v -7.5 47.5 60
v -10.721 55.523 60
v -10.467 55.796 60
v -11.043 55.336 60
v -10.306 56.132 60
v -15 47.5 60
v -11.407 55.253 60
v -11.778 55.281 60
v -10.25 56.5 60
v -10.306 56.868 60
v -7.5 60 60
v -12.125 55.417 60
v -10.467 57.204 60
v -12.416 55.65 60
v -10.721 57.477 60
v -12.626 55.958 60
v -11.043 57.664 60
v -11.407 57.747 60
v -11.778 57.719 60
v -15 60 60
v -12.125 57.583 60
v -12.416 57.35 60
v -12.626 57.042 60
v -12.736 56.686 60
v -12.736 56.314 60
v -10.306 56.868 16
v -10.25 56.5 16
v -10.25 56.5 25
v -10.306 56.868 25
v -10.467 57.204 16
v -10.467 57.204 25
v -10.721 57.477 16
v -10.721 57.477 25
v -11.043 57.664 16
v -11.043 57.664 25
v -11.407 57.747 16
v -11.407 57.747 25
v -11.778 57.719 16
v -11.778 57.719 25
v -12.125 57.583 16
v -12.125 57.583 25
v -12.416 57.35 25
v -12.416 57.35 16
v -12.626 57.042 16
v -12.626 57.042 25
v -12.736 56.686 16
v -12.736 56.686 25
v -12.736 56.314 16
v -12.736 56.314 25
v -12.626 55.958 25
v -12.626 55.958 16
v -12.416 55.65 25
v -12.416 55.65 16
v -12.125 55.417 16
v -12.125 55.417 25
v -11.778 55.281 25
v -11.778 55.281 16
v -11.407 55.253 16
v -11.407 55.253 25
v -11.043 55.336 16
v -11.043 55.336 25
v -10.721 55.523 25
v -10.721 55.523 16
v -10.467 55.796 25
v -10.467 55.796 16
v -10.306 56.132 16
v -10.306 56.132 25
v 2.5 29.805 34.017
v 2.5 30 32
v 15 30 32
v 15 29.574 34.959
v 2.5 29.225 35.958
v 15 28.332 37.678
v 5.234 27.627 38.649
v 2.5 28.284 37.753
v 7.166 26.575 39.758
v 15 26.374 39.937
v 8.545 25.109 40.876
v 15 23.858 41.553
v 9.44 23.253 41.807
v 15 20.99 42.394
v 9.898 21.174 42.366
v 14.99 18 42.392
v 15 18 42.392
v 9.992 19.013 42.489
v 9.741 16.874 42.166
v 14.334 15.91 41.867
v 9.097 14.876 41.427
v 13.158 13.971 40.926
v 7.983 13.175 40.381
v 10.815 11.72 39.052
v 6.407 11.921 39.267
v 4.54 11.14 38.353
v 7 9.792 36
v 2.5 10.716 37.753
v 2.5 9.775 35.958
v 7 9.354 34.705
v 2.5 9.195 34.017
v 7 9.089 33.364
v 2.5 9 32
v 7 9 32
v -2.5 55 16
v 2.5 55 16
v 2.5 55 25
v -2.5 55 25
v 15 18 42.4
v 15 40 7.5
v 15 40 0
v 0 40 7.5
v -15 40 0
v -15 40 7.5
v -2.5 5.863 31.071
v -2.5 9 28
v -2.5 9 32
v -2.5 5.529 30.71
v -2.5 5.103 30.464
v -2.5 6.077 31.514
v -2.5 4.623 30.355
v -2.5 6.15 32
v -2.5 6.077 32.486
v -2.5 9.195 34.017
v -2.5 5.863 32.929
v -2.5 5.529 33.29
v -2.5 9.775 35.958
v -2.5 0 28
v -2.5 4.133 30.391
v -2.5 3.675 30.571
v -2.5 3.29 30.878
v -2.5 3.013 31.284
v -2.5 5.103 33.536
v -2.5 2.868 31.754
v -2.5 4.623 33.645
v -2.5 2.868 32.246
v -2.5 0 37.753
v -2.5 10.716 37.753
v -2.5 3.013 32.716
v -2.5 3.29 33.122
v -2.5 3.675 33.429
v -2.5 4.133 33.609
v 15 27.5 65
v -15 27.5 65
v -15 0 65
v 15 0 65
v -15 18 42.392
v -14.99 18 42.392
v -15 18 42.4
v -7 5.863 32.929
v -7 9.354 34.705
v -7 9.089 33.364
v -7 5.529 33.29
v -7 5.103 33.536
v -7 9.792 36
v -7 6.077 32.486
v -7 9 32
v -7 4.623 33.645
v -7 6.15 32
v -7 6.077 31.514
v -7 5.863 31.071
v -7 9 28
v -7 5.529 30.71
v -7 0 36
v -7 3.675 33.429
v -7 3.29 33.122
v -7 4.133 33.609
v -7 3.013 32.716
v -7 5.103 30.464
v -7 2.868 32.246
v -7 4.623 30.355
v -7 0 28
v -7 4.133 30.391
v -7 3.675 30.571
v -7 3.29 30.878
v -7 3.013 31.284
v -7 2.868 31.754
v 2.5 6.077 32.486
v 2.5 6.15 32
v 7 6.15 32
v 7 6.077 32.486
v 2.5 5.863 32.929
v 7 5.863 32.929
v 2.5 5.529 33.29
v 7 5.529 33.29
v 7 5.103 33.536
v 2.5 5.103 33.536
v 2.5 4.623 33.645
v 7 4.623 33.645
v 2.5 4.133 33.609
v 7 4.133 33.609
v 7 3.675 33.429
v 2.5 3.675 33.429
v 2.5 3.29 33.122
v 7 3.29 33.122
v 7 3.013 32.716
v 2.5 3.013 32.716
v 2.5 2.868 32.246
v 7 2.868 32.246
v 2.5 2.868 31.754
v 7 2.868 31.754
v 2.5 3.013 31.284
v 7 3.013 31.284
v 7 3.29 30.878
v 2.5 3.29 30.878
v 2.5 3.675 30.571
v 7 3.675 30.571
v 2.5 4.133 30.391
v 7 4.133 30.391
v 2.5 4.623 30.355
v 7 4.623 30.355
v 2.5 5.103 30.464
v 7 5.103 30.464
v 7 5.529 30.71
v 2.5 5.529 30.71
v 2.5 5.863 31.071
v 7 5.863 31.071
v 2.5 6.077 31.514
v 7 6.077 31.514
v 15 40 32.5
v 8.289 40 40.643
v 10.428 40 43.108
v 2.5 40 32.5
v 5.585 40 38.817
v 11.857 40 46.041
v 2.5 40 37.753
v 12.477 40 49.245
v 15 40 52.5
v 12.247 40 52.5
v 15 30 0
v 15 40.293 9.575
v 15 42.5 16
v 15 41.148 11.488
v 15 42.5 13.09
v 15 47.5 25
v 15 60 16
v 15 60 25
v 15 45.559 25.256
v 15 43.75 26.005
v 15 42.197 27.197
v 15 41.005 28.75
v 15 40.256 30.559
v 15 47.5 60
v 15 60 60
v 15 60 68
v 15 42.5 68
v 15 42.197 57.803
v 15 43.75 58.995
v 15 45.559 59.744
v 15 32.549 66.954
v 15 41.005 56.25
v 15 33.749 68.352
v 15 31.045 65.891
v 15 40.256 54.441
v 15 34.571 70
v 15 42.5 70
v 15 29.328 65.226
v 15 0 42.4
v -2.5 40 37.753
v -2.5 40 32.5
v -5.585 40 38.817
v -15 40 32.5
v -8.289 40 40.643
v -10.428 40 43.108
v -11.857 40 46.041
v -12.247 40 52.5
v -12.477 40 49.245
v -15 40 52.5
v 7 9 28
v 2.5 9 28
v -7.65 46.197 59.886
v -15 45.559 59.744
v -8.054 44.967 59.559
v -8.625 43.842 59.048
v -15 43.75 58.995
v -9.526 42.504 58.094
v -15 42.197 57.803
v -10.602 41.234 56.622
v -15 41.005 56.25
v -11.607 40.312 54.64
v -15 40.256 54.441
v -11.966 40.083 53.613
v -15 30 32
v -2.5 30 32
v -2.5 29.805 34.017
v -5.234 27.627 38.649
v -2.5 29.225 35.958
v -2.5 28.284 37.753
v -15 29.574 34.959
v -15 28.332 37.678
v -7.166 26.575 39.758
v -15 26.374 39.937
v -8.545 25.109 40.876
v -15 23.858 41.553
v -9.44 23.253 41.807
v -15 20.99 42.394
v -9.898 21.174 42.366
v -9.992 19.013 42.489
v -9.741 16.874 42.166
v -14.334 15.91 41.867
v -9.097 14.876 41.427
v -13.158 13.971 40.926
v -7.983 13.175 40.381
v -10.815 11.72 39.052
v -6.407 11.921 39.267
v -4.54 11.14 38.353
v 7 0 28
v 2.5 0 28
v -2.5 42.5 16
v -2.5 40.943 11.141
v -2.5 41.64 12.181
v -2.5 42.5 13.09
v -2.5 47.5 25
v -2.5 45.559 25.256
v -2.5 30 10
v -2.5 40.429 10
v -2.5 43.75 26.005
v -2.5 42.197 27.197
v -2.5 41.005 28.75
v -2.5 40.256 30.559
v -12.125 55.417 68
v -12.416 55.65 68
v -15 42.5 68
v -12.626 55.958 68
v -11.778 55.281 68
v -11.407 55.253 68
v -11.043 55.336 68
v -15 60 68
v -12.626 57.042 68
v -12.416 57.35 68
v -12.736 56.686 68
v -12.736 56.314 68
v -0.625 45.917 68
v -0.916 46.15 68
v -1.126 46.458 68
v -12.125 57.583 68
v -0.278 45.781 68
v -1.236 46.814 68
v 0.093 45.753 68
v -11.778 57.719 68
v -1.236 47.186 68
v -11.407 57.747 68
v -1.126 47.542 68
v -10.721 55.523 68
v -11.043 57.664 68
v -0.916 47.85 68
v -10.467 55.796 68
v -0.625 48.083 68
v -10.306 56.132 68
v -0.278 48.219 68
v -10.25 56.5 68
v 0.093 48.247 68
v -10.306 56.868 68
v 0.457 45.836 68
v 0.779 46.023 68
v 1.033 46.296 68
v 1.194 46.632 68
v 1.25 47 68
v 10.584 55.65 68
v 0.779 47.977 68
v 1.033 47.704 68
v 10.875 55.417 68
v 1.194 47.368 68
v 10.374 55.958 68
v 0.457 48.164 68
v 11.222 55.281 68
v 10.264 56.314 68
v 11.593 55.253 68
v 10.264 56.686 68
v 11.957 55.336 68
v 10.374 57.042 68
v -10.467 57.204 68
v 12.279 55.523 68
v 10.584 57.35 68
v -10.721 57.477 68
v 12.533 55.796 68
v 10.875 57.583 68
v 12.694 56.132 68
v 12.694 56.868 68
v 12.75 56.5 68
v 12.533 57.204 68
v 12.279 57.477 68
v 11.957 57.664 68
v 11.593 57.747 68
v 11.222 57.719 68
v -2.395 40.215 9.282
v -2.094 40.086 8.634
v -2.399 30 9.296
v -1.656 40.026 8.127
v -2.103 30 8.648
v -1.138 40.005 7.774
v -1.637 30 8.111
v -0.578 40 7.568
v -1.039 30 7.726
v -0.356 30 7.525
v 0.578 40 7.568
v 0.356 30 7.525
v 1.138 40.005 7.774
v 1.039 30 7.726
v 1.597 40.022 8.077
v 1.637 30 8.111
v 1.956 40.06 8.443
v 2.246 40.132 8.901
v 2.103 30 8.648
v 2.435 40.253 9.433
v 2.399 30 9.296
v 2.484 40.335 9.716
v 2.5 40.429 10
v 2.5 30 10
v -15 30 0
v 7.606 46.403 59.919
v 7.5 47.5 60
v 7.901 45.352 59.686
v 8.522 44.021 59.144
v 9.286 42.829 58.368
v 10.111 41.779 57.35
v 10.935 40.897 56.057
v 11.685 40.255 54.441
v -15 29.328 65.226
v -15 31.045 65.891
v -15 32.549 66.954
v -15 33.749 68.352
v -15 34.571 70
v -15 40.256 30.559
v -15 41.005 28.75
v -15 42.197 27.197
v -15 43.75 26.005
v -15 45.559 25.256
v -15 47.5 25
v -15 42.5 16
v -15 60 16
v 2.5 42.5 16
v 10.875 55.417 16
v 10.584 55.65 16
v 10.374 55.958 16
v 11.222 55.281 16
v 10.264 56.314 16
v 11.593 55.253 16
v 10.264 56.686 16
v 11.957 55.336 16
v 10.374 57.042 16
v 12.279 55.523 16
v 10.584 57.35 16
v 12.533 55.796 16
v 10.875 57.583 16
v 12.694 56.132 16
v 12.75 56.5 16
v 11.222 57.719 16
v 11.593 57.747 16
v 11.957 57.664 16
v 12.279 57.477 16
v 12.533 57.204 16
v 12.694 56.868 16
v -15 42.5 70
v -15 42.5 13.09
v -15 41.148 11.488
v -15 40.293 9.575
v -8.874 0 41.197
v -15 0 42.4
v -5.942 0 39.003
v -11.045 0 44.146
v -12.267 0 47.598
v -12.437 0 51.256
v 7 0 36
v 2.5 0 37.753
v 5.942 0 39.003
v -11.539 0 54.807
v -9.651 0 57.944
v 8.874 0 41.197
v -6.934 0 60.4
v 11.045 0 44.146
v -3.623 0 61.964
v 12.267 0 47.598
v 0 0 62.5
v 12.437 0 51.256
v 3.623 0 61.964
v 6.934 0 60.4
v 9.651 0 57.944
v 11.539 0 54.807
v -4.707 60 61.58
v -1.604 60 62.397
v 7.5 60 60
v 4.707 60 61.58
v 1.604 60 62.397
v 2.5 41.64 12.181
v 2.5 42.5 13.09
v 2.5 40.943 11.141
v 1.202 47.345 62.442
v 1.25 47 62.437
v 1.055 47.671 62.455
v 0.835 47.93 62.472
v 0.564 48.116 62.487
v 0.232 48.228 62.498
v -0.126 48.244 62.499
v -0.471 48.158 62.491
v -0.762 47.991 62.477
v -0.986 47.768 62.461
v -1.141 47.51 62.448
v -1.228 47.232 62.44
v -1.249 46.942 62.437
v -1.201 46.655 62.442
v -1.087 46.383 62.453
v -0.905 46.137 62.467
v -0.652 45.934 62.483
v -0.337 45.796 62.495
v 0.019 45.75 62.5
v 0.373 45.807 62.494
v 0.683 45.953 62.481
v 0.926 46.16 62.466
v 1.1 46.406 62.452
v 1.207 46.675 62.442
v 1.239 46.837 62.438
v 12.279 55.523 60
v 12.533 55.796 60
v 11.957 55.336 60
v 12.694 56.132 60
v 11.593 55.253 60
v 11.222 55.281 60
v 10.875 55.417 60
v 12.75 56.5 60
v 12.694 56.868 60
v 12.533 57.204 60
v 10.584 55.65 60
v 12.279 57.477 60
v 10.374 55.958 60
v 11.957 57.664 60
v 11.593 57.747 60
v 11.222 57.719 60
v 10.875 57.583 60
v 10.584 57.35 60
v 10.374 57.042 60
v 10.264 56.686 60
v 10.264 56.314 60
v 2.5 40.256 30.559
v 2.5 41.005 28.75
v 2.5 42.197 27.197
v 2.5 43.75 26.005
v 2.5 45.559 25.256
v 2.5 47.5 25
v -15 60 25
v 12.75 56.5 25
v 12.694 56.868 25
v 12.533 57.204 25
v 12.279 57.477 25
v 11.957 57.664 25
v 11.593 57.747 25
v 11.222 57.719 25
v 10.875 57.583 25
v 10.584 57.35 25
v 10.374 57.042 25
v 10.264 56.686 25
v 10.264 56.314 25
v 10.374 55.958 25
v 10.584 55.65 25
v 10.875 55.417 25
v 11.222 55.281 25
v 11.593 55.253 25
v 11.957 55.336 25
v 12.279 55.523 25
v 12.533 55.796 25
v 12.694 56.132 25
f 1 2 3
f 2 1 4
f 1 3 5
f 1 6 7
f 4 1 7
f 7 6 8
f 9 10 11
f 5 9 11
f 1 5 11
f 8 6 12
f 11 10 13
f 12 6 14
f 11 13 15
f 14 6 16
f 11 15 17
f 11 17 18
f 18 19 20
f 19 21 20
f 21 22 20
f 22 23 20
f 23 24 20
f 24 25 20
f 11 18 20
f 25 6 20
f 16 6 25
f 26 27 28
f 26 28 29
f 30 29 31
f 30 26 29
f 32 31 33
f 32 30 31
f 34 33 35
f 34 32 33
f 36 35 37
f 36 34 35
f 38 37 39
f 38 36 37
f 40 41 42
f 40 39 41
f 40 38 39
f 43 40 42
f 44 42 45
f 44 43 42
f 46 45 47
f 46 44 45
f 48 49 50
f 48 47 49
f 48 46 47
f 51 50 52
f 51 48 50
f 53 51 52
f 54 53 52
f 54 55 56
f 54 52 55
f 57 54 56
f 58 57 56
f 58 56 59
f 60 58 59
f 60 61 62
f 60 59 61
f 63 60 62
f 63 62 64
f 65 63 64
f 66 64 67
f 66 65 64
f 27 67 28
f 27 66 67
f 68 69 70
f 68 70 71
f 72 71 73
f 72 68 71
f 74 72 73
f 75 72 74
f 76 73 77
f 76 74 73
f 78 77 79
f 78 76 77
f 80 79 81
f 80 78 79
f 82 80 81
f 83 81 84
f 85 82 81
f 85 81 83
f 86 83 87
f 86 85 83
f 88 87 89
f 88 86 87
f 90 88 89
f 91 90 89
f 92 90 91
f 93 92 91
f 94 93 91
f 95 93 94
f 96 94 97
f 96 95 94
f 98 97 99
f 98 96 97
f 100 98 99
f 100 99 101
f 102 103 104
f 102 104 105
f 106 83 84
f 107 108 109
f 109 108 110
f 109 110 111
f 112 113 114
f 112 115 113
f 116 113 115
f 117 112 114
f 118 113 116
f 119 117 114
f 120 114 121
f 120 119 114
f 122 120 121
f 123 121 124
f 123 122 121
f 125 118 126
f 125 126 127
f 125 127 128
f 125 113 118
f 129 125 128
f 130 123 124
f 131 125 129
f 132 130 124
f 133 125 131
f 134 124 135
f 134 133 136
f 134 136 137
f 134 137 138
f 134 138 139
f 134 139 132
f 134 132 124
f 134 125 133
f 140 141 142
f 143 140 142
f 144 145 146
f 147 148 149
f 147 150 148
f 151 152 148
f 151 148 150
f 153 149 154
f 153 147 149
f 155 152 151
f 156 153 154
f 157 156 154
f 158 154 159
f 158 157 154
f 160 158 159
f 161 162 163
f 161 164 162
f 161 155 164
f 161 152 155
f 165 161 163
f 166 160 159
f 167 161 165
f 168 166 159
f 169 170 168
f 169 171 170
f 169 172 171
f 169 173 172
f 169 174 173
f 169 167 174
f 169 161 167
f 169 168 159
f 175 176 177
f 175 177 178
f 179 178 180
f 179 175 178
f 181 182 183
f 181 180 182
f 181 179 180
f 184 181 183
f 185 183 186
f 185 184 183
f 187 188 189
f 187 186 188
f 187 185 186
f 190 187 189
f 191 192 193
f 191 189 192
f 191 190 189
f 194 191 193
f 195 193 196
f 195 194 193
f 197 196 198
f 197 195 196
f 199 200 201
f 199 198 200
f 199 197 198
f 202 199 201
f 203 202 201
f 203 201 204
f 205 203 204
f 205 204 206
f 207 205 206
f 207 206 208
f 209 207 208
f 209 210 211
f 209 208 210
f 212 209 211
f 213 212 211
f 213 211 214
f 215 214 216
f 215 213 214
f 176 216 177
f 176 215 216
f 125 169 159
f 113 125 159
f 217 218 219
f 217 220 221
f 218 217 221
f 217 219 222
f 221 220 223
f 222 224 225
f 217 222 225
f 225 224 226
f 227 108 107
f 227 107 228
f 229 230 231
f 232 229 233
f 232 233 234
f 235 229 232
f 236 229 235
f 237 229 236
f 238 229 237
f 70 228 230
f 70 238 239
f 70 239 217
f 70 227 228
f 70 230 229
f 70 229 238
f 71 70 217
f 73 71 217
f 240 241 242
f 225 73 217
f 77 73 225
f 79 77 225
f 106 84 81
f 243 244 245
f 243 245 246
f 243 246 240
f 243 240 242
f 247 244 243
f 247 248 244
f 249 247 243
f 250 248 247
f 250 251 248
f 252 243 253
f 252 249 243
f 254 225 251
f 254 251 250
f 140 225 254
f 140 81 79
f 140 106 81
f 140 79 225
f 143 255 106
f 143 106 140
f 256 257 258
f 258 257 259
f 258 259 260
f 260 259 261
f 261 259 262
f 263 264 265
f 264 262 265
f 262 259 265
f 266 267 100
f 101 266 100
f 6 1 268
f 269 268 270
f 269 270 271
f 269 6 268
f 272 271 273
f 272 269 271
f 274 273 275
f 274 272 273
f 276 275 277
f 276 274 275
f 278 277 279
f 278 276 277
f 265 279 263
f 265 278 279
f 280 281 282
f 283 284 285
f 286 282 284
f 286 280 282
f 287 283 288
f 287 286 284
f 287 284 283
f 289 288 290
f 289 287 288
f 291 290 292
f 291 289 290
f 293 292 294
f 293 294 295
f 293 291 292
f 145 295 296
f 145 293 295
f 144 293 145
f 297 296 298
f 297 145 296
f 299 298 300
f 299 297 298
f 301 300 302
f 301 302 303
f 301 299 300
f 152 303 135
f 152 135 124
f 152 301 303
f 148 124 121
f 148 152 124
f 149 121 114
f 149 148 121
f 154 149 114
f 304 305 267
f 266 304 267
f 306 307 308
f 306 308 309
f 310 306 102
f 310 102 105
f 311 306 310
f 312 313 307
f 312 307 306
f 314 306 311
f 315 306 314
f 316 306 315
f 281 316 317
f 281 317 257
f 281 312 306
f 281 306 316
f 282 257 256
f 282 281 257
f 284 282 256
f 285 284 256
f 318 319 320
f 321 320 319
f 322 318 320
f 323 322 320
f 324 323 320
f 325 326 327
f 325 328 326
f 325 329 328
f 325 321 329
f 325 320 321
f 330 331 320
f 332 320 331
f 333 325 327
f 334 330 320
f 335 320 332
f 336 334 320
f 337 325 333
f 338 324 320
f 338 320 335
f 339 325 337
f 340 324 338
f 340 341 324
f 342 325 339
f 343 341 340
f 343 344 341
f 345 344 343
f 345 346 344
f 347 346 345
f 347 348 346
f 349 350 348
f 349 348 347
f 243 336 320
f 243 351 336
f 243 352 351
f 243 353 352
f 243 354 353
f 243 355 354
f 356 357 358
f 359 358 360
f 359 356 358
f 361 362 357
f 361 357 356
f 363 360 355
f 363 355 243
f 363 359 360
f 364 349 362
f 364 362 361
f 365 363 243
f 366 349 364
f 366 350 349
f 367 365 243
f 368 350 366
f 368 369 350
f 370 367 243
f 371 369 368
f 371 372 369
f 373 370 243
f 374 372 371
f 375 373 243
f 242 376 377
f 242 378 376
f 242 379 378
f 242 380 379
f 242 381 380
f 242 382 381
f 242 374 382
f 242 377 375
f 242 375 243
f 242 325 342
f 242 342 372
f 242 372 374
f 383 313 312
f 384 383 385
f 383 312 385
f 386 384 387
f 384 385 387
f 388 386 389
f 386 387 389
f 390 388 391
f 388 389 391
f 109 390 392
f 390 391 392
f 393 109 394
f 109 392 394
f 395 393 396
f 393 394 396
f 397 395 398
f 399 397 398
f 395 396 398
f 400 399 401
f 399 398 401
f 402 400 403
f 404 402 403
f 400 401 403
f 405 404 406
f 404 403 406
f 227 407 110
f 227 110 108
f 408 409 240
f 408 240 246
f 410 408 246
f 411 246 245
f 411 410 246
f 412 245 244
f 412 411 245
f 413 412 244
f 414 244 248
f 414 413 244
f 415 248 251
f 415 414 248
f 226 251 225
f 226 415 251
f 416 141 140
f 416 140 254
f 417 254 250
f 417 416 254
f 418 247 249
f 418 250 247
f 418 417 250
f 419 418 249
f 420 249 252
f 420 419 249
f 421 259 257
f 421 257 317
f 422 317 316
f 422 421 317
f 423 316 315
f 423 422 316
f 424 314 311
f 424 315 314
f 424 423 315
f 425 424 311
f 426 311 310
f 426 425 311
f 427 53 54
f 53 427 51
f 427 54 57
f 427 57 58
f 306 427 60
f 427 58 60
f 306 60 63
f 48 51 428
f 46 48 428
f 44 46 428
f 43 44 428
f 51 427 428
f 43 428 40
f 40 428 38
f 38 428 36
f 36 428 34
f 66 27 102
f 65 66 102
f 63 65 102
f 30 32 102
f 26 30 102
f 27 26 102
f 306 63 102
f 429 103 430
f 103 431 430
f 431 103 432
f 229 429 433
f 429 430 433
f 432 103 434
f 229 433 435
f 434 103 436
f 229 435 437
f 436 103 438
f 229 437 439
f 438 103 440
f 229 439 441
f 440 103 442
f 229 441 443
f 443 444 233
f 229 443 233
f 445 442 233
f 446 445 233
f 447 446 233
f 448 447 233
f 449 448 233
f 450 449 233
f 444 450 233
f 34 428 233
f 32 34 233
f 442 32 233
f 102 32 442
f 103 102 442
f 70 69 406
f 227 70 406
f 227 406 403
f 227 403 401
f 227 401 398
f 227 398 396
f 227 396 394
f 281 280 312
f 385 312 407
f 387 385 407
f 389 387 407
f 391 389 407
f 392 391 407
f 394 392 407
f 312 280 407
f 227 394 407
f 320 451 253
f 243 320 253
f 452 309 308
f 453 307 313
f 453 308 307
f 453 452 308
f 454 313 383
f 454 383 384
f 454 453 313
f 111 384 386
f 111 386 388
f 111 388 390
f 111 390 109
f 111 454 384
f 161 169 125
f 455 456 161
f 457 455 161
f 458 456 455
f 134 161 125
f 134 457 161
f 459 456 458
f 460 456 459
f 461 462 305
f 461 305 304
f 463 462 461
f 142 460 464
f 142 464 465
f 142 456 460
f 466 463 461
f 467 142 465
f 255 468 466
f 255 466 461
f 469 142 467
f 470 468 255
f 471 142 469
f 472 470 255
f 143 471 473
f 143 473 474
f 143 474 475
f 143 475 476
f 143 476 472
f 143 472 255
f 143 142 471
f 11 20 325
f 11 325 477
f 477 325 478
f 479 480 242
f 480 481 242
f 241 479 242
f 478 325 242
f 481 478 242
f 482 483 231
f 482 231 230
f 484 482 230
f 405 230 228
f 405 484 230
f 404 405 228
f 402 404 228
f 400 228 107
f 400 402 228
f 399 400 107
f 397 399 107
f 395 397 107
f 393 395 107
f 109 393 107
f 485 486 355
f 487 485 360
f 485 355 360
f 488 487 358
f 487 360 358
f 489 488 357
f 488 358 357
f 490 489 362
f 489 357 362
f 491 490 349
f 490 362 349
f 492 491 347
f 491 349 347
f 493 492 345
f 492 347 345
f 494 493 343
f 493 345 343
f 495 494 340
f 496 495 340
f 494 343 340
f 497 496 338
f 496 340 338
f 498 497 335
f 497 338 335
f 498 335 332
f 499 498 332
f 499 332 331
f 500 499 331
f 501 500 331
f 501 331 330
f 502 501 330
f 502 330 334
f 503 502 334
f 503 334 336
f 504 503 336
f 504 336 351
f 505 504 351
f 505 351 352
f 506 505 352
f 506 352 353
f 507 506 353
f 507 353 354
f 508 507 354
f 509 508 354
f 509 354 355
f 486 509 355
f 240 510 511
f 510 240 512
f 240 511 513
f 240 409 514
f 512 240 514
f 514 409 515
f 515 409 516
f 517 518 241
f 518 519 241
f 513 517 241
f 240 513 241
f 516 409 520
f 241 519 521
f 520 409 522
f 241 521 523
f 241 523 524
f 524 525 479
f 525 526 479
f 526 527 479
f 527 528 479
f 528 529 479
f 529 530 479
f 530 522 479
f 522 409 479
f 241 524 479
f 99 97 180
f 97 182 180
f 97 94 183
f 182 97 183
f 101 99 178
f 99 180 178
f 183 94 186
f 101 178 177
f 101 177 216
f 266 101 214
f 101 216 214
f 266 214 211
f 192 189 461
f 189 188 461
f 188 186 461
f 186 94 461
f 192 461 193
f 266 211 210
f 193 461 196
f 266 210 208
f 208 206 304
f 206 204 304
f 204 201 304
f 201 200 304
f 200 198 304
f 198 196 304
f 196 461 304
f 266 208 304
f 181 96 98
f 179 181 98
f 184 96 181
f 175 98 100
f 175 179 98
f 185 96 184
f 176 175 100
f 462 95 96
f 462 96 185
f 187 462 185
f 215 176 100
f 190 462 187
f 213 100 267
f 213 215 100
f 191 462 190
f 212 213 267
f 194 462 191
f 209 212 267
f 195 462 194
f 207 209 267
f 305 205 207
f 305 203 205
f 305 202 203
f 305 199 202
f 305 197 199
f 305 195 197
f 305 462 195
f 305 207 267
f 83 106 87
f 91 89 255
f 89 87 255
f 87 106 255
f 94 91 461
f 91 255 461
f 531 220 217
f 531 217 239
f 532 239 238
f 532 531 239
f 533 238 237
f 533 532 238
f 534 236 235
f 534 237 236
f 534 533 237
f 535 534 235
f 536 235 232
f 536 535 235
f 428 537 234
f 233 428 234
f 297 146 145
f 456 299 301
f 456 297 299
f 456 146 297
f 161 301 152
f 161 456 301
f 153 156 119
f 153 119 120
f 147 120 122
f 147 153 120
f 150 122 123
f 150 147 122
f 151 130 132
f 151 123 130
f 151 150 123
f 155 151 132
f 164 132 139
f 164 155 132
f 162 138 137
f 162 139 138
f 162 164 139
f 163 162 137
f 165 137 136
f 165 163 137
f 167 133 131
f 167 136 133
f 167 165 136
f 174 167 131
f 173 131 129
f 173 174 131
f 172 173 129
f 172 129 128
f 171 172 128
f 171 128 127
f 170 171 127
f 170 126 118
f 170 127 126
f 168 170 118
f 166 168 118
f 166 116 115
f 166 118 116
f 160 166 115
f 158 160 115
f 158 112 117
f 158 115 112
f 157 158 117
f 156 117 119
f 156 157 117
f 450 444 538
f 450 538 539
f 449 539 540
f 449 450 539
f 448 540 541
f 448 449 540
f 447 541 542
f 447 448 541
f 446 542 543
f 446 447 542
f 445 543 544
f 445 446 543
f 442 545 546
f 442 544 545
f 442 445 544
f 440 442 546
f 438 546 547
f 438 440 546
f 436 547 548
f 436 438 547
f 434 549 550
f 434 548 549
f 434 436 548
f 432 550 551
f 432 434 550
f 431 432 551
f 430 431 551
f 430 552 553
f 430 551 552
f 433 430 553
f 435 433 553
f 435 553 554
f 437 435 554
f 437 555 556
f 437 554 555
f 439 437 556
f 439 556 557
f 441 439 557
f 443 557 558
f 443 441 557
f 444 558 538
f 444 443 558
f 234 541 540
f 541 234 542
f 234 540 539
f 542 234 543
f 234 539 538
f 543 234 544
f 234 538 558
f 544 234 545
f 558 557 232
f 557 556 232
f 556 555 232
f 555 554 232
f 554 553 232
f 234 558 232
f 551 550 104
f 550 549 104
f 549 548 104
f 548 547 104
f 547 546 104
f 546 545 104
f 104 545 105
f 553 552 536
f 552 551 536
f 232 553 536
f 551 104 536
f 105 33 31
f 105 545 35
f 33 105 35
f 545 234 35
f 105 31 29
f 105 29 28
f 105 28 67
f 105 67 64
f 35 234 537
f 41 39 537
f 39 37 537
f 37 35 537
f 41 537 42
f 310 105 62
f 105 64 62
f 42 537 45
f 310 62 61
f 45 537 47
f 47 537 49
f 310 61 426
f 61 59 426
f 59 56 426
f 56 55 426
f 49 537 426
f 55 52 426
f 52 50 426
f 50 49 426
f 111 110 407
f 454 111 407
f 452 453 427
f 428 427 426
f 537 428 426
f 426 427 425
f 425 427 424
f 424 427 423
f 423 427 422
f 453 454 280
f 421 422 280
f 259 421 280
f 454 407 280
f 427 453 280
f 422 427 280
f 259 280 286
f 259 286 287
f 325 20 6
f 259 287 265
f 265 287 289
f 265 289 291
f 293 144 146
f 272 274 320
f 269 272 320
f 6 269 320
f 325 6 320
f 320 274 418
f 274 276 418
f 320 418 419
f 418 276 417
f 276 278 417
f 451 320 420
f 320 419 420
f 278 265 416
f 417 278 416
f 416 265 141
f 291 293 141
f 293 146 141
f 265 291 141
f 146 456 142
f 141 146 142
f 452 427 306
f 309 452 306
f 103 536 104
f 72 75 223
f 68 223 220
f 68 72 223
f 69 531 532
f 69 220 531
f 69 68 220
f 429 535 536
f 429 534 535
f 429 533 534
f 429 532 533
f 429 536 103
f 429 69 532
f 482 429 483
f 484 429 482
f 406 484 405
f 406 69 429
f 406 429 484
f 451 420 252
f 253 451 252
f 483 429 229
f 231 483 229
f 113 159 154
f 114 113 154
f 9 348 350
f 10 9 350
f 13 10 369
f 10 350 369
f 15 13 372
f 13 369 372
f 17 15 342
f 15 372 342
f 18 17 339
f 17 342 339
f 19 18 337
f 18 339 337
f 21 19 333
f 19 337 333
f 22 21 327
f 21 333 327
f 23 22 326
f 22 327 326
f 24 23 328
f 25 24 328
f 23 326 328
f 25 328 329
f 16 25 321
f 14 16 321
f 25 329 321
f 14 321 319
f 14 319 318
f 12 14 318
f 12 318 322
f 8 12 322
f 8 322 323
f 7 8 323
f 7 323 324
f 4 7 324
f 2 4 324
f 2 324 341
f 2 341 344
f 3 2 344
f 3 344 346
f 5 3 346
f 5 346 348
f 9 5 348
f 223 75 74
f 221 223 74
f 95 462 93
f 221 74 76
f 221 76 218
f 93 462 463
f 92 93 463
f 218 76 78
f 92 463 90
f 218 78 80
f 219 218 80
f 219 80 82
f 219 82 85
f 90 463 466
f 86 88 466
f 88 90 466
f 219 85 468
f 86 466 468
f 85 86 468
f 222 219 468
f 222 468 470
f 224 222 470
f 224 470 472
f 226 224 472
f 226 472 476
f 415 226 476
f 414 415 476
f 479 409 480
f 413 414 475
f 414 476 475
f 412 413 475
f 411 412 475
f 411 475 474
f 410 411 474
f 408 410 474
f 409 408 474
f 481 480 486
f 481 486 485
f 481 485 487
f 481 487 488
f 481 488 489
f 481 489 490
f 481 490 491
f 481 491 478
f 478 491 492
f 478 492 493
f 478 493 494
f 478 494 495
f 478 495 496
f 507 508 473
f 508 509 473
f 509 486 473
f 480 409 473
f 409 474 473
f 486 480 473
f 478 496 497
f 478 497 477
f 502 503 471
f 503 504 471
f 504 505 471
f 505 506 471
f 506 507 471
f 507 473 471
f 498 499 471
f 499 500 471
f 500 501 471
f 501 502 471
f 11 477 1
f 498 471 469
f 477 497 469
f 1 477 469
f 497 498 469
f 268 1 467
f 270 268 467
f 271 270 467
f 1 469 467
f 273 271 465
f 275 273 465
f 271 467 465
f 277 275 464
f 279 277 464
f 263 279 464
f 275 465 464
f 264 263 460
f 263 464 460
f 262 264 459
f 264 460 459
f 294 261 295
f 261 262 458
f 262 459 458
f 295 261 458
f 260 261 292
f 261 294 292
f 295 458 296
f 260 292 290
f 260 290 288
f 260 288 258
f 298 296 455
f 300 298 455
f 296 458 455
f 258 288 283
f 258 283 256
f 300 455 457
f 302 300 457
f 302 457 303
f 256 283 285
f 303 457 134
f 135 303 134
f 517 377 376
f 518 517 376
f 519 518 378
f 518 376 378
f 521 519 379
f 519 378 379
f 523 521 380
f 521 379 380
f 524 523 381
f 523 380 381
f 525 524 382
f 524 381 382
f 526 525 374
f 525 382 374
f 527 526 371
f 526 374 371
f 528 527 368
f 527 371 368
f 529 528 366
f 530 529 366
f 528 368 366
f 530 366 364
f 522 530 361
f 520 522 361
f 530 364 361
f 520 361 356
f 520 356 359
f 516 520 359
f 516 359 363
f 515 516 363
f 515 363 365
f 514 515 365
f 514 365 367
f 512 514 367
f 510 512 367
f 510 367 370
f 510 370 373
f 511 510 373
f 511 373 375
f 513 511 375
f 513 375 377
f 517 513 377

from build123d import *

# Parameters (mm, degrees)
SKETCH013_R                          = 1.25
EXTRUDE009_DEPTH                     = 12
SKETCH012_R                          = 1.25
EXTRUDE008_DEPTH                     = 15
SKETCH011_W                          = 40
SKETCH011_H                          = 25
EXTRUDE007_DEPTH                     = 5
SKETCH010_W                          = 40
SKETCH010_H                          = 25
EXTRUDE006_DEPTH                     = 2
EXTRUDE004_DEPTH                     = 18
EXTRUDE004_ONTO_SKETCH007_ROLL_ANGLE = 90
SKETCH006_AS_DRAWN_R                 = 12.5
EXTRUDE003_DEPTH                     = 65
EXTRUDE003_ONTO_SKETCH006_ROLL_ANGLE = 90
EXTRUDE002_DEPTH                     = 60
EXTRUDE002_ONTO_SKETCH005_ROLL_ANGLE = 90
SKETCH004_R                          = 1.65
EXTRUDE_DEPTH                        = 40
SKETCH_AS_DRAWN_W                    = 30
SKETCH_AS_DRAWN_H                    = 70
EXTRUDE001_DEPTH                     = 60
EXTRUDE001_ONTO_SKETCH_ROLL_ANGLE    = 90


with BuildPart() as extrude009:
    # Sketch013 → Extrude009 (new body)
    with BuildSketch(Plane.XY.offset(15)):
        with Locations((11.5, 56.5)):
            Circle(SKETCH013_R)
        with Locations((-11.5, 56.5)):
            Circle(SKETCH013_R)
    extrude(amount=EXTRUDE009_DEPTH)


with BuildPart() as extrude008:
    # Sketch012 → Extrude008 (new body)
    with BuildSketch(Plane.XY.offset(70)):
        with Locations((0, 47)):
            Circle(SKETCH012_R)
        with Locations((11.5, 56.5)):
            Circle(SKETCH012_R)
        with Locations((-11.5, 56.5)):
            Circle(SKETCH012_R)
    extrude(amount=-EXTRUDE008_DEPTH)


with BuildPart() as extrude007:
    # Sketch011 → Extrude007 (new body)
    with BuildSketch(Plane(origin=(0, 35, 16), x_dir=(1, 0, 0), z_dir=(0, 0, 1))):
        with Locations((0, 20)):
            Rectangle(SKETCH011_W, SKETCH011_H)
    extrude(amount=-EXTRUDE007_DEPTH)


with BuildPart() as extrude006:
    # Sketch010 → Extrude006 (new body)
    with BuildSketch(Plane(origin=(0, 35, 70), x_dir=(1, 0, 0), z_dir=(0, 0, 1))):
        with Locations((0, 20)):
            Rectangle(SKETCH010_W, SKETCH010_H)
    extrude(amount=-EXTRUDE006_DEPTH)


with BuildPart() as extrude004:
    # Sketch007 as drawn → Extrude004 (new)
    with BuildSketch(Plane.XY):
        Polygon((17, 44), (7, 36), (7, 25), (17, 25), align=None)
        Polygon((-17, 44), (-7, 36), (-7, 25), (-17, 25), align=None)
    extrude(amount=-EXTRUDE004_DEPTH)


with BuildPart() as extrude004_1:
    # Extrude004 onto Sketch007 roll: moved
    add(extrude004.part.rotate(Axis((0, 0, 0), (1, 0, 0)), EXTRUDE004_ONTO_SKETCH007_ROLL_ANGLE))


with BuildPart() as extrude004_2:
    # Extrude004 onto Sketch007 placement: moved
    add(extrude004_1.part)


with BuildPart() as extrude003:
    # Sketch006 as drawn → Extrude003 (new)
    with BuildSketch(Plane.XY):
        with Locations((0, 50)):
            Circle(SKETCH006_AS_DRAWN_R)
    extrude(amount=-EXTRUDE003_DEPTH)


with BuildPart() as extrude003_1:
    # Extrude003 onto Sketch006 roll: moved
    add(extrude003.part.rotate(Axis((0, 0, 0), (1, 0, 0)), EXTRUDE003_ONTO_SKETCH006_ROLL_ANGLE))


with BuildPart() as extrude003_2:
    # Extrude003 onto Sketch006 placement: moved
    add(extrude003_1.part)


with BuildPart() as extrude002:
    # Sketch005 as drawn → Extrude002 (new)
    with BuildSketch(Plane.XY):
        with BuildLine():
            Line((2.5, 50), (2.5, 10))
            ThreePointArc((-2.5, 10), (0, 7.5), (2.5, 10))
            Line((-2.5, 10), (-2.5, 50))
            ThreePointArc((2.5, 50), (0, 52.5), (-2.5, 50))
        make_face()
    extrude(amount=-EXTRUDE002_DEPTH)


with BuildPart() as extrude002_1:
    # Extrude002 onto Sketch005 roll: moved
    add(extrude002.part.rotate(Axis((0, 0, 0), (1, 0, 0)), EXTRUDE002_ONTO_SKETCH005_ROLL_ANGLE))


with BuildPart() as extrude002_2:
    # Extrude002 onto Sketch005 placement: moved
    add(extrude002_1.part.moved(Location((0, -5, 0))))


with BuildPart() as extrude_cut_xy:
    # Sketch004 → Extrude (new body)
    with BuildSketch(Plane(origin=(0, 40, 0), x_dir=(0, 1, 0), z_dir=(1, 0, 0))):
        with Locations((-35.5, 32)):
            Circle(SKETCH004_R)
        with BuildLine():
            Line((7.5, 15), (30, 15))
            Line((30, 15), (30, 0))
            Line((30, 0), (0, 0))
            Line((0, 0), (0, 7.5))
            ThreePointArc((7.5, 15), (2.196699, 12.803301), (0, 7.5))
        make_face()
        with BuildLine():
            Line((7.5, 60), (30, 60))
            Line((30, 60), (30, 25))
            Line((30, 25), (7.5, 25))
            ThreePointArc((0, 32.5), (2.196699, 27.196699), (7.5, 25))
            Line((0, 32.5), (0, 52.5))
            ThreePointArc((7.5, 60), (2.196699, 57.803301), (0, 52.5))
        make_face()
        with BuildLine():
            Line((-10, 32), (-10, 0))
            Line((-10, 0), (-41, 0))
            Line((-41, 0), (-41, 28))
            Line((-41, 28), (-31, 28))
            Line((-31, 28), (-31, 32))
            ThreePointArc((-10, 32), (-20.5, 42.5), (-31, 32))
        make_face()
        with BuildLine():
            Line((-41, 80), (-5, 80))
            Line((-5, 80), (-5, 72.5))
            ThreePointArc((-12.5, 65), (-7.196699, 67.196699), (-5, 72.5))
            Line((-12.5, 65), (-41, 65))
            Line((-41, 65), (-41, 80))
        make_face()
    extrude(amount=EXTRUDE_DEPTH)


with BuildPart() as extrude_cut_xy_1:
    # Extrude placement: moved
    add(extrude_cut_xy.part.moved(Location((-20, 0, 0))))


with BuildPart() as cut007:
    # Sketch as drawn → Extrude001 (new)
    with BuildSketch(Plane.XY):
        with Locations((0, 35)):
            Rectangle(SKETCH_AS_DRAWN_W, SKETCH_AS_DRAWN_H)
    extrude(amount=-EXTRUDE001_DEPTH)


with BuildPart() as cut007_1:
    # Extrude001 onto Sketch roll: moved
    add(cut007.part.rotate(Axis((0, 0, 0), (1, 0, 0)), EXTRUDE001_ONTO_SKETCH_ROLL_ANGLE))


with BuildPart() as cut007_2:
    # Extrude001 onto Sketch placement: moved
    add(cut007_1.part)

    # Cut: cut extrude-cut-xy
    add(extrude_cut_xy_1.part, mode=Mode.SUBTRACT)

    # Cut001: cut Extrude002
    add(extrude002_2.part, mode=Mode.SUBTRACT)

    # Cut002: cut Extrude003
    add(extrude003_2.part, mode=Mode.SUBTRACT)

    # Cut003: cut Extrude004
    add(extrude004_2.part, mode=Mode.SUBTRACT)

    # Cut004: cut Extrude006
    add(extrude006.part, mode=Mode.SUBTRACT)

    # Cut005: cut Extrude007
    add(extrude007.part, mode=Mode.SUBTRACT)

    # Cut006: cut Extrude008
    add(extrude008.part, mode=Mode.SUBTRACT)

    # Cut007: cut Extrude009
    add(extrude009.part, mode=Mode.SUBTRACT)


solid = cut007_2.part
